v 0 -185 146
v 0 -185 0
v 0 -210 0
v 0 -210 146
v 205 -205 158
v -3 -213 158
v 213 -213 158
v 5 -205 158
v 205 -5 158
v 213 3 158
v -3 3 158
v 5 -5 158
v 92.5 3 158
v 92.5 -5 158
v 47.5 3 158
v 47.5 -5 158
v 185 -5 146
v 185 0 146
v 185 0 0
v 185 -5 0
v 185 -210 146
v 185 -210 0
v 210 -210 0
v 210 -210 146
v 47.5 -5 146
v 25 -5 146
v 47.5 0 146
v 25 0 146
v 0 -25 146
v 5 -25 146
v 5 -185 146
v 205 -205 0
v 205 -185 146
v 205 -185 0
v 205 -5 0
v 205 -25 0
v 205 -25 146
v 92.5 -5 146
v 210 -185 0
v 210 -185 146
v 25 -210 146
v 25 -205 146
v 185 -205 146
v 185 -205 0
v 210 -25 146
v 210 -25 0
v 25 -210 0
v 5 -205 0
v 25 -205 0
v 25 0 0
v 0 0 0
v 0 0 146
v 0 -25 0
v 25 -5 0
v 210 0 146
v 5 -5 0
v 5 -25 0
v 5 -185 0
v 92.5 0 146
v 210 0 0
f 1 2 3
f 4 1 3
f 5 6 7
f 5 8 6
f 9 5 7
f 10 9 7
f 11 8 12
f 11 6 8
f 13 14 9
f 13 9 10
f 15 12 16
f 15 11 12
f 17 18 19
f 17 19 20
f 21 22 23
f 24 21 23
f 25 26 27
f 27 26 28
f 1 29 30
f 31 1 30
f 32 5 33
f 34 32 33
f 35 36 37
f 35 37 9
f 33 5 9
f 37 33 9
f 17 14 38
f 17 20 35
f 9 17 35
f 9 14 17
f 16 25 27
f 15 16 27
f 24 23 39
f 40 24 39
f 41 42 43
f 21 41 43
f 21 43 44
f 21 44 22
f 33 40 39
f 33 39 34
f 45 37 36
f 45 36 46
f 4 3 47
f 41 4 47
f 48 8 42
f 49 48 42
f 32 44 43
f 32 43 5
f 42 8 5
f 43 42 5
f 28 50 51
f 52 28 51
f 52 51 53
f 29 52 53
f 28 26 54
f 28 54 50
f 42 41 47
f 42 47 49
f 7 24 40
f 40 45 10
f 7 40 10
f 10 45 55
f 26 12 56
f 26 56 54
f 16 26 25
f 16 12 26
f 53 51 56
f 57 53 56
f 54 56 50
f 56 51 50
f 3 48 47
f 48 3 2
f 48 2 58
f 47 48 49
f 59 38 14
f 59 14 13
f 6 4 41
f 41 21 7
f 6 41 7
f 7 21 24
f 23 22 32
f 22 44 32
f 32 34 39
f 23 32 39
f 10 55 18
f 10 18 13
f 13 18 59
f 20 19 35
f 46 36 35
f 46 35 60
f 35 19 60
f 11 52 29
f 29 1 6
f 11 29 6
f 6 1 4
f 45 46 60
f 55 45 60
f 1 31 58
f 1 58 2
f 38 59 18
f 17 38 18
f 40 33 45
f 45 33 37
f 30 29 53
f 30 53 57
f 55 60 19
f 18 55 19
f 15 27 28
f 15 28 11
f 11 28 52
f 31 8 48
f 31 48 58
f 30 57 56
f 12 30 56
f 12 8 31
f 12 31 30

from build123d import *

# Parameters (mm, degrees)
F1_DEPTH = 146
F4_W     = 216
F4_H     = 216
F2_W     = 210
F2_H     = 210
F6_W     = 200
F6_H     = 200
F7_DEPTH = 12
F8_W     = 45
F8_H     = 25
F9_DEPTH = 180


with BuildPart() as f1:
    # F0 (on Top) → F1 (new body)
    with BuildSketch(Plane.XY):
        Polygon((25, 0), (0, 0), (0, -25), (5, -25), (5, -5), (25, -5), align=None)
    extrude(amount=F1_DEPTH)



with BuildPart() as f1b:
    # F0 (on Top) → F1, piece 2 (new body)
    with BuildSketch(Plane.XY):
        Polygon((210, 0), (185, 0), (185, -5), (205, -5), (205, -25), (210, -25), align=None)
    extrude(amount=F1_DEPTH)


with BuildPart() as f1c:
    # F0 (on Top) → F1, piece 3 (new body)
    with BuildSketch(Plane.XY):
        Polygon((5, -185), (0, -185), (0, -210), (25, -210), (25, -205), (5, -205), align=None)
    extrude(amount=F1_DEPTH)


with BuildPart() as f1d:
    # F0 (on Top) → F1, piece 4 (new body)
    with BuildSketch(Plane.XY):
        Polygon((185, -210), (210, -210), (210, -185), (205, -185), (205, -205), (185, -205), align=None)
    extrude(amount=F1_DEPTH)


with BuildPart() as f1_1:
    add(f1.part)

    add(f1b.part)  # F5 merges F1b

    add(f1c.part)  # F5 merges F1c

    add(f1d.part)  # F5 merges F1d
    # F4 (on offset) → F5 section 0
    with BuildSketch(Plane.XY.offset(158)):
        with Locations((105, -105)):
            Rectangle(F4_W, F4_H)
    # F2 (on face) → F5 section 1
    with BuildSketch(Plane.XY.offset(146)):
        with Locations((105, -105)):
            Rectangle(F2_W, F2_H)
    loft()

    # F6 (on face) → F7 (cut)
    with BuildSketch(Plane.XY.offset(158)):
        with Locations((105, -105)):
            Rectangle(F6_W, F6_H)
    extrude(amount=-F7_DEPTH, mode=Mode.SUBTRACT)

    # F8 (on Top) → F9 (cut)
    with BuildSketch(Plane.XY):
        with Locations((70, 7.5)):
            Rectangle(F8_W, F8_H)
    extrude(amount=F9_DEPTH, mode=Mode.SUBTRACT)


solid = f1_1.part
